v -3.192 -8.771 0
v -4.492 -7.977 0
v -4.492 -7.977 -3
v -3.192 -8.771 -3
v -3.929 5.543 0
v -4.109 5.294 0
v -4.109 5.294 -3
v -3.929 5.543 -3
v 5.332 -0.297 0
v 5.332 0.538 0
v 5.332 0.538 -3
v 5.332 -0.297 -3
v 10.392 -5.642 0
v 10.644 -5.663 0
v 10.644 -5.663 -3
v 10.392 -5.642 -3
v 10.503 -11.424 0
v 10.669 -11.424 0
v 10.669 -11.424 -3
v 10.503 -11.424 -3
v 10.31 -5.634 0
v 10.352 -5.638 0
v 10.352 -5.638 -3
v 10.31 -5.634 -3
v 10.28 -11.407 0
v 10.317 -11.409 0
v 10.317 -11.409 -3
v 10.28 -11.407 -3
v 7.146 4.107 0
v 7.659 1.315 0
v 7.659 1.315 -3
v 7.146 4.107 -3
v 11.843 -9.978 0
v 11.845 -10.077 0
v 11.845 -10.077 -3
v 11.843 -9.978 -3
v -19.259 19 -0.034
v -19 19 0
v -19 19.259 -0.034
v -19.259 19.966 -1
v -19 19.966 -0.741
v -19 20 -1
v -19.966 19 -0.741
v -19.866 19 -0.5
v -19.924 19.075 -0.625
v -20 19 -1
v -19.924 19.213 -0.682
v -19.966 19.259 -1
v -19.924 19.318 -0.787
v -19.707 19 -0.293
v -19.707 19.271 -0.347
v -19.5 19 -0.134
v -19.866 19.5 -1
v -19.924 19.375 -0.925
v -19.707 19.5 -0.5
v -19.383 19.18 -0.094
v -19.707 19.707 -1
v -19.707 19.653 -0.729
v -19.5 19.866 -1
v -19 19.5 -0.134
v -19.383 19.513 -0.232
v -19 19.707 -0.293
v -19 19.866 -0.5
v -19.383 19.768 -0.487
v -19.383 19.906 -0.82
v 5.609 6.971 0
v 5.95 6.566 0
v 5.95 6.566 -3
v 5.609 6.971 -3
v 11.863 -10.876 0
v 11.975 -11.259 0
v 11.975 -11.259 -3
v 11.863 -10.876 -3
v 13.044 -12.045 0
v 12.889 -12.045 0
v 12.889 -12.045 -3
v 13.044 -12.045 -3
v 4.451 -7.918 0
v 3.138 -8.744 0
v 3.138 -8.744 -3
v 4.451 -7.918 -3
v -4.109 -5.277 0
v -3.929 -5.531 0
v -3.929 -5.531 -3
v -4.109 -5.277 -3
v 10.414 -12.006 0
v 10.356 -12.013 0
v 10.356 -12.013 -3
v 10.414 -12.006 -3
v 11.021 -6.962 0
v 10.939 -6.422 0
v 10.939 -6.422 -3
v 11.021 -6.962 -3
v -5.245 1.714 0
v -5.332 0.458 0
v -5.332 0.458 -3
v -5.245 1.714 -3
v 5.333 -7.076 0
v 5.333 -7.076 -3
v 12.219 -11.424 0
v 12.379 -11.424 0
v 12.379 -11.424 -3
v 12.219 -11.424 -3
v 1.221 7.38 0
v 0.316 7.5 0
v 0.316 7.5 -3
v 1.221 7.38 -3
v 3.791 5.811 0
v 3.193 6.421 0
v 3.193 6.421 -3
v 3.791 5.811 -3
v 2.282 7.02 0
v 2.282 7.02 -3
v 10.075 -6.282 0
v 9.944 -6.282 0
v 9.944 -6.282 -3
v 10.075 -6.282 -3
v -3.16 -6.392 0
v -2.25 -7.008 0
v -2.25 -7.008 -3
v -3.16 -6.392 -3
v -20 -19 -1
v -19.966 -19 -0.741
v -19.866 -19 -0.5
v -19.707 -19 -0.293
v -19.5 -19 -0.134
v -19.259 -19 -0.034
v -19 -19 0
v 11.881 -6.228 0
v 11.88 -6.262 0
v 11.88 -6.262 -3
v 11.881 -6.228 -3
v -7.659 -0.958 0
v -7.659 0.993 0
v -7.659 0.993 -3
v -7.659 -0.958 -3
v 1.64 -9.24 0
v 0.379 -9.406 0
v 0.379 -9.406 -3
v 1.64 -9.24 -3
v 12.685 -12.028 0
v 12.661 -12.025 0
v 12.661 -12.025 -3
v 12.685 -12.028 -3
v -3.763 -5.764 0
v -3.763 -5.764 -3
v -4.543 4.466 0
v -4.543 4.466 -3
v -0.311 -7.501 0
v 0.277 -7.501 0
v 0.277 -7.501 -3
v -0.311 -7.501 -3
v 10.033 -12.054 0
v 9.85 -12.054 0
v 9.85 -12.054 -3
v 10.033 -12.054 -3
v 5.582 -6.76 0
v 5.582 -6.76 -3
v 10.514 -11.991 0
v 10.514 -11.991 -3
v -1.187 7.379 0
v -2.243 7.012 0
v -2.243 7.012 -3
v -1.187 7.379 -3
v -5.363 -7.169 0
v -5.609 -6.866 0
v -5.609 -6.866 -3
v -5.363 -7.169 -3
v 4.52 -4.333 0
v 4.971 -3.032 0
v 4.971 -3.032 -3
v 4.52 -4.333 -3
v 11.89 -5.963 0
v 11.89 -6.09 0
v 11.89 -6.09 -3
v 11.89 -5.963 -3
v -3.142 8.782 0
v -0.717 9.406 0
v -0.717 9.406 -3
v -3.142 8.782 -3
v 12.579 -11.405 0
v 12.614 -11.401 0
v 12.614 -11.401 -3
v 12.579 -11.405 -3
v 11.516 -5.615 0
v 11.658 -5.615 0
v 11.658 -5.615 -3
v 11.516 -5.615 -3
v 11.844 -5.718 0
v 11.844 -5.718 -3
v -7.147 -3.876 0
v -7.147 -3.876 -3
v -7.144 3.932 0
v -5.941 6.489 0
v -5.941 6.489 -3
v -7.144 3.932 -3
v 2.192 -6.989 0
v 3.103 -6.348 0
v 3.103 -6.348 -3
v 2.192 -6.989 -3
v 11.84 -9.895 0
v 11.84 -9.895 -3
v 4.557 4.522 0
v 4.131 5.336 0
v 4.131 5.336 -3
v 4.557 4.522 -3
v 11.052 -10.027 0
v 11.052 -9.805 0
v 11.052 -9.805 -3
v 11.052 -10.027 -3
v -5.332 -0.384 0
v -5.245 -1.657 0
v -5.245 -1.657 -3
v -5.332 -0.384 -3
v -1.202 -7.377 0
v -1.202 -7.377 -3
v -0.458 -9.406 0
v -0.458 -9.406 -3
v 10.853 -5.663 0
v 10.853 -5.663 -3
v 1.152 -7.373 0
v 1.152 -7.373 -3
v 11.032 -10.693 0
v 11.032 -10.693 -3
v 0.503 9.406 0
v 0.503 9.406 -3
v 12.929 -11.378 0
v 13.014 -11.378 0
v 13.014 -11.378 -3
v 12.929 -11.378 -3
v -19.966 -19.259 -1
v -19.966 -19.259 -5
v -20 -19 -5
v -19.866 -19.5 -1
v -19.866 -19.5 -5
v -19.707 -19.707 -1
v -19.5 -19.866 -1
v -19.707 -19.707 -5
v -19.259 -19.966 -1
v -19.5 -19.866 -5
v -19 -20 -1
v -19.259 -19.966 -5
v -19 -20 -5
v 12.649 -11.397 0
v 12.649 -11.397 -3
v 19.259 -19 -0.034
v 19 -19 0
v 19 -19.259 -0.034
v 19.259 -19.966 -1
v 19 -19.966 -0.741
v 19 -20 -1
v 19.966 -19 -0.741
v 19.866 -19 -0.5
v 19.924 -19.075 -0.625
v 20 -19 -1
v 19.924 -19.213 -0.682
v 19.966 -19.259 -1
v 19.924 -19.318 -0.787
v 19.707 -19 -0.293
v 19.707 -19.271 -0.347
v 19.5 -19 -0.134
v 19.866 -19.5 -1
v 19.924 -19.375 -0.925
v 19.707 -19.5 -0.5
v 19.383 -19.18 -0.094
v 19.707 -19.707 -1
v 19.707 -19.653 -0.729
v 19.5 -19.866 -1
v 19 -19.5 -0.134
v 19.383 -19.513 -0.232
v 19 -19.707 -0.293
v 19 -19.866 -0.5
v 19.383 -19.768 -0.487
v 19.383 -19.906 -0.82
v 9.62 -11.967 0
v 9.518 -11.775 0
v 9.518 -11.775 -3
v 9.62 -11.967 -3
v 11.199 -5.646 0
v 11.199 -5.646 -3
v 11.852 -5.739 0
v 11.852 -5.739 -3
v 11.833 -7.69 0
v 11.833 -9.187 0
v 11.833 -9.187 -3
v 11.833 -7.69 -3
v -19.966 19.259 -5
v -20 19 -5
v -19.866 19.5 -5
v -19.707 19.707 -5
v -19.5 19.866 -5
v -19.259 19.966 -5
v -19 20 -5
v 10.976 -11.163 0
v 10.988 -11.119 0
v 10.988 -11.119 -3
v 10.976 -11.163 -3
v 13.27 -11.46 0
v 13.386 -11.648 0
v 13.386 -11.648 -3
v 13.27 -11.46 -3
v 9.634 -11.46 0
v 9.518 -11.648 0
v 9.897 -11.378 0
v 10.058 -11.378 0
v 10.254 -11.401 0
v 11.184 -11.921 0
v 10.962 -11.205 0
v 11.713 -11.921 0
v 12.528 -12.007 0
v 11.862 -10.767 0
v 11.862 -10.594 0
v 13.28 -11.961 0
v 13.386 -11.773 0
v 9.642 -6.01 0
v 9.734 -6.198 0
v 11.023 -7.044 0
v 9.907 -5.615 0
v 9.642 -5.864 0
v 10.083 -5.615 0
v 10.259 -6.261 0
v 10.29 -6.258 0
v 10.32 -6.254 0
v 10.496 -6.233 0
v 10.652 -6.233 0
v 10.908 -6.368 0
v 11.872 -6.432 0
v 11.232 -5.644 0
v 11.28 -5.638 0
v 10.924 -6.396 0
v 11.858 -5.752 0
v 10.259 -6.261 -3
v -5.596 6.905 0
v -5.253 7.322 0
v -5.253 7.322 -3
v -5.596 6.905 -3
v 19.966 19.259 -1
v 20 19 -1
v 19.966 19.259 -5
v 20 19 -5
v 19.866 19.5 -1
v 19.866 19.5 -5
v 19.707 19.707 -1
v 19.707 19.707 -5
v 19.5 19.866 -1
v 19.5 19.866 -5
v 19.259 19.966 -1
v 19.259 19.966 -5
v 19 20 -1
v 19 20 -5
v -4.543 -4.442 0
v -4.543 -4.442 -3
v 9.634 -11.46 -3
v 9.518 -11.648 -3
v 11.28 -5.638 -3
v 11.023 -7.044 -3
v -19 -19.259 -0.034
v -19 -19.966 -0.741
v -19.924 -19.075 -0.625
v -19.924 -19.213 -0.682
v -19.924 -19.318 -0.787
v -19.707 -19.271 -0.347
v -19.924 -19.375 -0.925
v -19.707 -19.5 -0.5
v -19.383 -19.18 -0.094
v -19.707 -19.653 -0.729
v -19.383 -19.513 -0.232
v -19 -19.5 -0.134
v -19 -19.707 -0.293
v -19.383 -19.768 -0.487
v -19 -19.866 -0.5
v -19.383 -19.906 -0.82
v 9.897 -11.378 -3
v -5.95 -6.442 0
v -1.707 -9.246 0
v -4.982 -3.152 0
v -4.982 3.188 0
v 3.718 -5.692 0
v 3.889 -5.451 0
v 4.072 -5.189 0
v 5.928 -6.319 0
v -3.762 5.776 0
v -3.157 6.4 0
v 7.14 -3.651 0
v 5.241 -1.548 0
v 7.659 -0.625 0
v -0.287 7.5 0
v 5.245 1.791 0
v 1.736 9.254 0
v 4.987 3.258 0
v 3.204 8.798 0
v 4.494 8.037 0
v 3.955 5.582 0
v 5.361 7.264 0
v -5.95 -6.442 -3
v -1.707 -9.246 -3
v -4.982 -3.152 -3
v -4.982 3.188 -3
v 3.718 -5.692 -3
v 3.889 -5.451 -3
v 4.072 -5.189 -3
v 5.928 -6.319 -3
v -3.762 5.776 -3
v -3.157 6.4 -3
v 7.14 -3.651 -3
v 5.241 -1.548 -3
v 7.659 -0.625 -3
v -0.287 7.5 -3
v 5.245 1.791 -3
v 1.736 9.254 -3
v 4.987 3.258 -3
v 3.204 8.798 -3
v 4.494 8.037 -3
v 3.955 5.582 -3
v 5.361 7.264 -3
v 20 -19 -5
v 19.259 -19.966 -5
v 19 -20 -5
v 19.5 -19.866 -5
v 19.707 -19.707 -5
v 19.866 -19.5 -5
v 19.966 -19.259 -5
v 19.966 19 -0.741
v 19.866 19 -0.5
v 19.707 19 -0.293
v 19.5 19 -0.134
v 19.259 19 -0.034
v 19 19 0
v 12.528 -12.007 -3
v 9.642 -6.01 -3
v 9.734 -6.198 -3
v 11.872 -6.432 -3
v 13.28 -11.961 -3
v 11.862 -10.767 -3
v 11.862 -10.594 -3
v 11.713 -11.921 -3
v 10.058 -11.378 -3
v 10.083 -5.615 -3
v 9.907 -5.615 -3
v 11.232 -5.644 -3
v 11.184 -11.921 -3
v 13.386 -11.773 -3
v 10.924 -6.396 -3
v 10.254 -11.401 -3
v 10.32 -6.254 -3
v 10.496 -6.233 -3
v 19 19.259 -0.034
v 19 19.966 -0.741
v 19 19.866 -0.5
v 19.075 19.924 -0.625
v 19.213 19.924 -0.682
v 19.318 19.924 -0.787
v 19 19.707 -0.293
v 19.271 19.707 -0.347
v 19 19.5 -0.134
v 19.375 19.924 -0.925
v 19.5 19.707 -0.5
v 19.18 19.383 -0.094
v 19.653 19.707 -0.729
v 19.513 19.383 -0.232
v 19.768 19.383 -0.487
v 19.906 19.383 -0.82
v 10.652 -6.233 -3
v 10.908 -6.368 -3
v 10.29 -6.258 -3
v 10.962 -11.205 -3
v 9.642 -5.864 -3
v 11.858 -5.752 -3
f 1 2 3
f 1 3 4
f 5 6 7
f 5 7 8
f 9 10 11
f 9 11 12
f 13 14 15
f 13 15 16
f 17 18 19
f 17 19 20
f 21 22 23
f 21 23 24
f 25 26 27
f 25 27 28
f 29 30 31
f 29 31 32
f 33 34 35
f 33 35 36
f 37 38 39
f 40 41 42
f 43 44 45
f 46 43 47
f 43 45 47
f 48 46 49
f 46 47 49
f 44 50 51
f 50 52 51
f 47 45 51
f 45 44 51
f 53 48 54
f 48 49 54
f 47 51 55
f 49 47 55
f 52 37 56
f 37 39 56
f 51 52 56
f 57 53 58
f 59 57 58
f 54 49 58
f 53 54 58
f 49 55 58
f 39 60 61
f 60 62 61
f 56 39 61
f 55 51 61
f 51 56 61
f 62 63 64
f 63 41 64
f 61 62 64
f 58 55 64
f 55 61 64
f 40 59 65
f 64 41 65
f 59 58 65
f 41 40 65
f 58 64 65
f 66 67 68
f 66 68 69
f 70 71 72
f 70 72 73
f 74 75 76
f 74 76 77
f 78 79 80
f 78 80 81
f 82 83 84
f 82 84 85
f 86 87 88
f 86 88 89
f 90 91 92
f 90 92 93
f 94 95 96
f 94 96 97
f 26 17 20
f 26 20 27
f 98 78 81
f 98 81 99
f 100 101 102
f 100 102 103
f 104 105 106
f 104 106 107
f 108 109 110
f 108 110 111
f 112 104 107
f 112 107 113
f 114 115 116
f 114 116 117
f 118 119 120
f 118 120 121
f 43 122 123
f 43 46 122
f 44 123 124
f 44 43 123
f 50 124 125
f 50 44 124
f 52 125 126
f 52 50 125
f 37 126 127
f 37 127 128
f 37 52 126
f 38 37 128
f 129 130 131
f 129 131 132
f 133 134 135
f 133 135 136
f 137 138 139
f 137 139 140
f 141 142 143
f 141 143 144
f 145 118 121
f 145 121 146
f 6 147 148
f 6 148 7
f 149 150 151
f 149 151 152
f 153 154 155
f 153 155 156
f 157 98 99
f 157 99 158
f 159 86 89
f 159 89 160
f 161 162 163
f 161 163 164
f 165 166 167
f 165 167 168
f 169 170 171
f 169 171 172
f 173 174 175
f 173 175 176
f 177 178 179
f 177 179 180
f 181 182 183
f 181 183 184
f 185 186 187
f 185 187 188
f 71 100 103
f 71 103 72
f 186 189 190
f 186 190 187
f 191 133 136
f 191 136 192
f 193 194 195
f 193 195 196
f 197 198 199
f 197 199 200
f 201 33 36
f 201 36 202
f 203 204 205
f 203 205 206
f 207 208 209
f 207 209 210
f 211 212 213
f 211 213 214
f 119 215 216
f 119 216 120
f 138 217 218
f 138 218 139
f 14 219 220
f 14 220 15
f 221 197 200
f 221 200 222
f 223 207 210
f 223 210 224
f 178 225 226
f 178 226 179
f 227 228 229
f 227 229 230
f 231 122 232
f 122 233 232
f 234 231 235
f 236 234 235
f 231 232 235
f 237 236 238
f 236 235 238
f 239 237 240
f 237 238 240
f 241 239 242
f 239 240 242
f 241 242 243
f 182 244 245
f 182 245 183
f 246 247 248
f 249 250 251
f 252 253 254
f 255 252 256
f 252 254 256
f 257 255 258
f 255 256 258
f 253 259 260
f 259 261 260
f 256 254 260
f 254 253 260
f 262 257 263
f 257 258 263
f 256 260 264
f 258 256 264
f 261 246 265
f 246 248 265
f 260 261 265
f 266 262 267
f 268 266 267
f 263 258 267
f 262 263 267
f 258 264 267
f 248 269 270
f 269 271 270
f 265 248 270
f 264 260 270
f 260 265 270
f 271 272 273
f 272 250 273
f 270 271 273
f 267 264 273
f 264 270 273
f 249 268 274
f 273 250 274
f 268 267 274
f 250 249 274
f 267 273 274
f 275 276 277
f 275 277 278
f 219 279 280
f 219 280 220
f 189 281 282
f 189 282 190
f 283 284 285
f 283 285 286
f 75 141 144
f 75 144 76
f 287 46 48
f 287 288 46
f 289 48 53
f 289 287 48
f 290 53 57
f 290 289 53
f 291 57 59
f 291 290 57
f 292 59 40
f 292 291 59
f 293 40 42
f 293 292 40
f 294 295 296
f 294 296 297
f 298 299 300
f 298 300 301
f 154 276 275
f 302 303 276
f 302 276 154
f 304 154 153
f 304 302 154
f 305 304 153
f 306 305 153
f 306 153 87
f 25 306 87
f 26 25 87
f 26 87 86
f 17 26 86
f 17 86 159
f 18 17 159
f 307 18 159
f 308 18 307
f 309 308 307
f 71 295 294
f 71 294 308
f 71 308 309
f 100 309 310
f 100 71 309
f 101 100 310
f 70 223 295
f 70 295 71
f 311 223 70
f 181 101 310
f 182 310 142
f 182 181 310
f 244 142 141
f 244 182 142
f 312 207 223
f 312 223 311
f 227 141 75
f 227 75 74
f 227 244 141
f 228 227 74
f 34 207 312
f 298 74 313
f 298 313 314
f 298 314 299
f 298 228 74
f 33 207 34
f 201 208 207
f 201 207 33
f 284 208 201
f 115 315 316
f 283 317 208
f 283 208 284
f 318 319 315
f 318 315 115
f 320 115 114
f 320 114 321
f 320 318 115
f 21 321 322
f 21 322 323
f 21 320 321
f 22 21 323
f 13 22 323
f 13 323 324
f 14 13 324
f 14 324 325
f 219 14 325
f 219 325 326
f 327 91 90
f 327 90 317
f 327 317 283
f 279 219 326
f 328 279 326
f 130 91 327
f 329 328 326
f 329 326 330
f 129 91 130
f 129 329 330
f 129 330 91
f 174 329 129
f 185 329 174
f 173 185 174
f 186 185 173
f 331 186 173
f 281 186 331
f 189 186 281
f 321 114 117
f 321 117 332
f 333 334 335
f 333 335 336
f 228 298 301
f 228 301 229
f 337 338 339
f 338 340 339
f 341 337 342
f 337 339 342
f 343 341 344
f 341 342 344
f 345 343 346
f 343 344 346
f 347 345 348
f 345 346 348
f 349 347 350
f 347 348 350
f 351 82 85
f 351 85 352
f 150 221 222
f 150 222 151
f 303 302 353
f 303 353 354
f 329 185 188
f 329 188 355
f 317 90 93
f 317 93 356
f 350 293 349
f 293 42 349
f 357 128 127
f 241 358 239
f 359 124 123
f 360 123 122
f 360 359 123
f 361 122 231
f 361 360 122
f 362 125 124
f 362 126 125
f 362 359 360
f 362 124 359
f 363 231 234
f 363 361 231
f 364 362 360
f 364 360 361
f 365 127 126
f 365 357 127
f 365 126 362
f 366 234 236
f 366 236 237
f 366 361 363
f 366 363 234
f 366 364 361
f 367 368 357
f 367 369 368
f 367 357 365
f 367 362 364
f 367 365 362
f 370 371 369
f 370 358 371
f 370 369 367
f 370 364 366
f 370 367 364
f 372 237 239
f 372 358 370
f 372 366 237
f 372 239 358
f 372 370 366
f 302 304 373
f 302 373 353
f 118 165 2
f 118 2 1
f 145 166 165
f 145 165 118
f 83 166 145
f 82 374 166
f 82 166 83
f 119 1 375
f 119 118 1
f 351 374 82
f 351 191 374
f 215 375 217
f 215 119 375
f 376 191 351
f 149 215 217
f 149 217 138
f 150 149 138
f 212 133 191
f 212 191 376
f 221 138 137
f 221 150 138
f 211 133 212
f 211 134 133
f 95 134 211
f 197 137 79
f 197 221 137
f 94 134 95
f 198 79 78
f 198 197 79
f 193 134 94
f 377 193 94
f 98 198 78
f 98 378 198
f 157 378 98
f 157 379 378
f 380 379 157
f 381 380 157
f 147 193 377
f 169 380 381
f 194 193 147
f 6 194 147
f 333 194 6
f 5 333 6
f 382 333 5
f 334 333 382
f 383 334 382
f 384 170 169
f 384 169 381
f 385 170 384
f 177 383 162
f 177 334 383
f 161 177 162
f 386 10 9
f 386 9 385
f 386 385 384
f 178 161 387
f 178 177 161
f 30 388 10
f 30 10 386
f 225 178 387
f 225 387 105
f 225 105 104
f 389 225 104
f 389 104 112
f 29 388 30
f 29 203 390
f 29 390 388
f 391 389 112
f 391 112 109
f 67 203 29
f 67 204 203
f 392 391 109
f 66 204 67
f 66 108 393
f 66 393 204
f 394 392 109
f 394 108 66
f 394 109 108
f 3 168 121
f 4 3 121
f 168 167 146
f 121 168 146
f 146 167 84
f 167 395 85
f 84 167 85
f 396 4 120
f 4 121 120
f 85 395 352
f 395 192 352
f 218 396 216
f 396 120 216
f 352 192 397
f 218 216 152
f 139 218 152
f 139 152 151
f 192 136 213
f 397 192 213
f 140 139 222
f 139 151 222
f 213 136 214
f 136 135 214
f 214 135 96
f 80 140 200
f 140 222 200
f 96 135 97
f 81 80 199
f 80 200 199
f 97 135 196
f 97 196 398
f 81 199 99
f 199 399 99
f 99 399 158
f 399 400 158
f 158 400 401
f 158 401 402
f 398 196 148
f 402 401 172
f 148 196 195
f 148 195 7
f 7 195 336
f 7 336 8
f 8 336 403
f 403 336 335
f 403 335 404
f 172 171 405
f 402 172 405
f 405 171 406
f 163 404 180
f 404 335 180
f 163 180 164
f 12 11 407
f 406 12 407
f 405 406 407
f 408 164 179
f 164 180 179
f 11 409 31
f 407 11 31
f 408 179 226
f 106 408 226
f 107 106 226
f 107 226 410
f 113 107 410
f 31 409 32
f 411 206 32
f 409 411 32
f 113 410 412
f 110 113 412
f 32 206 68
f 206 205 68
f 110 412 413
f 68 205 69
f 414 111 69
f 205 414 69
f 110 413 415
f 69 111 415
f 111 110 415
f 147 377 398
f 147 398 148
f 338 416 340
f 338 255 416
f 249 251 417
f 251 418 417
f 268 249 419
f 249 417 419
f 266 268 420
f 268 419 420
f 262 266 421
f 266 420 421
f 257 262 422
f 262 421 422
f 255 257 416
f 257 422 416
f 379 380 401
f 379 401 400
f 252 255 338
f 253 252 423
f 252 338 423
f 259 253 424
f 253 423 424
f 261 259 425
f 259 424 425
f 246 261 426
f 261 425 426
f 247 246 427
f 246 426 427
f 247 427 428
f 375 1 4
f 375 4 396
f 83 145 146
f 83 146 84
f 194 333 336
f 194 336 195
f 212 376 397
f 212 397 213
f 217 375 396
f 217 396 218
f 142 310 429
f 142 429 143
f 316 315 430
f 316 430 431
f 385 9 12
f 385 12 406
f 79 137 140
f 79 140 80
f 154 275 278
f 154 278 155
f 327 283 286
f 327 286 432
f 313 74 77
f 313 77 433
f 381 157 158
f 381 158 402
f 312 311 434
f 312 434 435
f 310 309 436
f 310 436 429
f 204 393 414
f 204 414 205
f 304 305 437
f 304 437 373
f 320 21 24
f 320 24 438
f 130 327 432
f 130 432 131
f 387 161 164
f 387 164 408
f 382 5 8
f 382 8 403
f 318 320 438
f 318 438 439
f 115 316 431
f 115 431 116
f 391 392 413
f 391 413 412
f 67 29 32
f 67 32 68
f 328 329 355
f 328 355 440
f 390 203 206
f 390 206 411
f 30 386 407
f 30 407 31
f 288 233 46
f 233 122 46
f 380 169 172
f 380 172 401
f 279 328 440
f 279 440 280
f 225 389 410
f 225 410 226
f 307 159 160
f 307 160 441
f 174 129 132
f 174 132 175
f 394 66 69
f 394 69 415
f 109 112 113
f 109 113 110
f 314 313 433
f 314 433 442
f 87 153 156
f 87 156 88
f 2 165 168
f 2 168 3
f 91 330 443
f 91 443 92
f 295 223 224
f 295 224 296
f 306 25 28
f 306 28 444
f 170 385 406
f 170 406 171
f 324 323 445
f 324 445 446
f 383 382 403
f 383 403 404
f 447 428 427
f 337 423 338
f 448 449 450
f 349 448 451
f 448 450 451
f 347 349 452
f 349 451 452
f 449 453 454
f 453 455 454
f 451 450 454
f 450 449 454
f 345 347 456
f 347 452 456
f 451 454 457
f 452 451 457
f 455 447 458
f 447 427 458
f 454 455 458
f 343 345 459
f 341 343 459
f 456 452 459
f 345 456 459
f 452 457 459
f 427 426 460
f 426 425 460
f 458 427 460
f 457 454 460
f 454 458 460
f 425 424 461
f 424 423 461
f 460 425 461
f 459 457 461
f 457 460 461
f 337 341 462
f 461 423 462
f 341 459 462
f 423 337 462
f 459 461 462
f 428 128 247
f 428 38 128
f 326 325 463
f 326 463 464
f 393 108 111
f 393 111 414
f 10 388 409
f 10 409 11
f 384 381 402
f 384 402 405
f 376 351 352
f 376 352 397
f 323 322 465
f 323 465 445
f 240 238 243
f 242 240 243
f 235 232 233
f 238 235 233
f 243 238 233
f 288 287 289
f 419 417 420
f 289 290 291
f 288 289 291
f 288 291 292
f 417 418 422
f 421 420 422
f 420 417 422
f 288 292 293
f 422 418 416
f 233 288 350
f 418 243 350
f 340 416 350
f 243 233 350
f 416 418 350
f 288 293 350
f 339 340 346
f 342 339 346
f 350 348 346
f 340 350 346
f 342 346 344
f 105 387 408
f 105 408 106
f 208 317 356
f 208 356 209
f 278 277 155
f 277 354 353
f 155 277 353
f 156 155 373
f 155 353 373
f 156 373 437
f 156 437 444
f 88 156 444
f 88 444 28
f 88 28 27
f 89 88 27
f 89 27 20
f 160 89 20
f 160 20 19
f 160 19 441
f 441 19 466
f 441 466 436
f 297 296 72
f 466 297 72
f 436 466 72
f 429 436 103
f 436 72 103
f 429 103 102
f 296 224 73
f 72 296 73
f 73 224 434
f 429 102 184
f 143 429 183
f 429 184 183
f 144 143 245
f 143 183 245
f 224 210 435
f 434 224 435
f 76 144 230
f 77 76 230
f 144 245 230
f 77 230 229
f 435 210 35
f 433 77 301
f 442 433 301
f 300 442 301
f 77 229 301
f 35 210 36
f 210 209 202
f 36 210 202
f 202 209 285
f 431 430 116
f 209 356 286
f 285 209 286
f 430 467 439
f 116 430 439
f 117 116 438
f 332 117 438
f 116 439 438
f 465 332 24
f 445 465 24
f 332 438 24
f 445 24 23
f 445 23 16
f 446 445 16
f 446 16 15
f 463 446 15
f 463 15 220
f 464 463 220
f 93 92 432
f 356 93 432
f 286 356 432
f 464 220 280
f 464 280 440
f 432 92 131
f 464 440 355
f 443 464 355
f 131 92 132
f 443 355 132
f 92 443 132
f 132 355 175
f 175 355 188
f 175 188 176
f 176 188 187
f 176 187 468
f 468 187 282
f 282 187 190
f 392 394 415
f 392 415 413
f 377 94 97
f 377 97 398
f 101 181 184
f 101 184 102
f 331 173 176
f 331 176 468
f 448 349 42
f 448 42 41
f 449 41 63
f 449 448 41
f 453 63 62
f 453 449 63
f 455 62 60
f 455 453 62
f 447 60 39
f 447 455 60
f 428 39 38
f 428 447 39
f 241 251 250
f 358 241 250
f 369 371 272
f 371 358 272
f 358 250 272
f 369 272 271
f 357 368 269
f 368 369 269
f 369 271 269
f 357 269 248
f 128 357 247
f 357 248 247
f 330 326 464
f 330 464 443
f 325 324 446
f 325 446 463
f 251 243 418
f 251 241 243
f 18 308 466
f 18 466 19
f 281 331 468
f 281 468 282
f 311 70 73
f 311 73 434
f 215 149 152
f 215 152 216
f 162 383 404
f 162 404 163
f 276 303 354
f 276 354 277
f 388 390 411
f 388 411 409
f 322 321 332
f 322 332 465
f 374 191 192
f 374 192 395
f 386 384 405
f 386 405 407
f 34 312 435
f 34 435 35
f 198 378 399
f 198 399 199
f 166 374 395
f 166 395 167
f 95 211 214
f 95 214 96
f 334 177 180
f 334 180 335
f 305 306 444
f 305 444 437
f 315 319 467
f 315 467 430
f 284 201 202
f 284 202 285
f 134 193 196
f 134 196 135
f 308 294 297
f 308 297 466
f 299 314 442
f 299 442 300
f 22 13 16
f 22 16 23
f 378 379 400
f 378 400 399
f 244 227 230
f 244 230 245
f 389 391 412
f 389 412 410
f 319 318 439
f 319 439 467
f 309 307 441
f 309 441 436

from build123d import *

# Parameters (mm, degrees)
F0_W     = 40
F0_H     = 40
F1_DEPTH = 5
F2_R     = 1
F5_DEPTH = 3


with BuildPart() as f1:
    # F0 (on Top) → F1 (new body)
    with BuildSketch(Plane.XY):
        Rectangle(F0_W, F0_H)
    extrude(amount=-F1_DEPTH)

    # F2
    f2_edges = [f1.edges().sort_by_distance(p)[0] for p in [
        (0, -20, 0),
        (20, 0, 0),
        (0, 20, 0),
        (-20, 0, 0),
        (-20, 20, -2.5),
        (20, 20, -2.5),
        (-20, -20, -2.5),
        (20, -20, -2.5),
    ]]
    fillet(f2_edges, radius=F2_R)


with BuildPart() as f5:
    # F3 (on Top) + F4 (on Top) → F5 (new body)
    with BuildSketch(Plane.XY):
        Polygon((-0.45753, -9.405798), (-0.03998, -9.405798), (0.378943, -9.405798), (1.639849, -9.240444), (3.137789, -8.744331), (4.451071, -7.91751), (5.333009, -7.075526), (5.582412, -6.759956), (5.928309, -6.318987), (7.13961, -3.651098), (7.659116, -0.624942), (7.659116, 0.383794), (7.659116, 1.315339), (7.146493, 4.107256), (5.950356, 6.565671), (5.608599, 6.970801), (5.360568, 7.264349), (4.493793, 8.037424), (3.203931, 8.798077), (1.736344, 9.254211), (0.502996, 9.405798), (0.092329, 9.405798), (-0.716559, 9.405798), (-3.141904, 8.781567), (-5.253076, 7.32221), (-5.59623, 6.90466), (-5.94073, 6.488506), (-7.14375, 3.93225), (-7.659141, 0.992861), (-7.659141, 0.013106), (-7.659141, -0.958418), (-7.146519, -3.875735), (-5.950382, -6.441643), (-5.608625, -6.866077), (-5.363337, -7.169252), (-4.492396, -7.976768), (-3.191561, -8.770518), (-1.707388, -9.24593), align=None)
        Polygon((-0.286639, 7.49996), (0.013792, 7.49996), (0.315544, 7.49996), (1.220927, 7.380097), (2.282038, 7.020433), (3.192907, 6.420968), (3.790975, 5.810504), (3.954958, 5.581726), (4.131335, 5.336438), (4.557166, 4.522013), (4.987112, 3.258363), (5.244821, 1.790751), (5.331638, 0.53815), (5.331638, 0.119228), (5.331638, -0.296951), (5.24068, -1.548232), (4.970577, -3.032354), (4.519955, -4.333215), (4.072103, -5.188991), (3.888816, -5.450815), (3.71795, -5.691988), (3.103347, -6.347943), (2.192452, -6.988708), (1.152017, -7.373188), (0.276987, -7.501357), (-0.013792, -7.501357), (-0.311429, -7.501357), (-1.201649, -7.377328), (-2.250338, -7.008012), (-3.159836, -6.392037), (-3.763442, -5.763641), (-3.928796, -5.530774), (-4.109314, -5.27718), (-4.5434, -4.442104), (-4.9816, -3.152267), (-5.244821, -1.657096), (-5.331638, -0.383769), (-5.331638, 0.039268), (-5.331638, 0.458191), (-5.244821, 1.713586), (-4.9816, 3.188106), (-4.5434, 4.465549), (-4.109314, 5.293716), (-3.928796, 5.543169), (-3.76207, 5.776036), (-3.157093, 6.400317), (-2.243455, 7.012153), (-1.18651, 7.3787), align=None, mode=Mode.SUBTRACT)
    with BuildSketch(Plane.XY):
        Polygon((11.022813, -7.043704), (11.051744, -9.805293), (11.051744, -10.027137), (11.032465, -10.692744), (10.988345, -11.118549), (10.97595, -11.162644), (10.962183, -11.205367), (10.668661, -11.424467), (10.56668, -11.424467), (10.503281, -11.424467), (10.317252, -11.409303), (10.280041, -11.40656), (10.253853, -11.401048), (10.058172, -11.377629), (9.985147, -11.377629), (9.896958, -11.377629), (9.633738, -11.460306), (9.51799, -11.647708), (9.51799, -11.711106), (9.51799, -11.774504), (9.619971, -11.967417), (9.850095, -12.054235), (9.92726, -12.054235), (10.033381, -12.054235), (10.355834, -12.012909), (10.413721, -12.006), (10.514305, -11.990836), (11.184052, -11.92058), (11.441735, -11.92058), (11.71321, -11.92058), (12.527636, -12.007397), (12.661291, -12.025304), (12.68471, -12.028047), (12.888672, -12.044583), (12.965837, -12.044583), (13.044399, -12.044583), (13.280035, -11.960534), (13.386131, -11.773107), (13.386131, -11.711106), (13.386131, -11.647708), (13.270383, -11.460306), (13.014071, -11.377629), (12.928626, -11.377629), (12.648896, -11.396908), (12.614453, -11.401048), (12.578614, -11.405188), (12.378792, -11.424467), (12.300255, -11.424467), (12.21895, -11.424467), (11.975034, -11.259113), (11.863401, -10.876005), (11.862029, -10.76714), (11.862029, -10.593506), (11.845494, -10.076743), (11.84275, -9.977531), (11.839982, -9.894854), (11.833098, -9.186549), (11.833098, -8.110275), (11.833098, -7.689981), (11.871681, -6.431843), (11.879936, -6.262323), (11.881333, -6.227906), (11.889588, -6.090111), (11.889588, -6.033596), (11.889588, -5.963315), (11.857889, -5.752469), (11.852377, -5.738702), (11.844122, -5.718027), (11.658092, -5.614674), (11.594694, -5.614674), (11.516157, -5.614674), (11.280496, -5.638093), (11.232261, -5.643579), (11.199191, -5.646373), (10.853319, -5.662883), (10.727919, -5.662883), (10.643845, -5.662883), (10.391674, -5.642208), (10.351694, -5.638093), (10.310368, -5.633953), (10.082988, -5.614674), (9.994799, -5.614674), (9.90661, -5.614674), (9.642018, -5.864077), (9.642018, -5.948151), (9.642018, -6.010152), (9.734347, -6.197604), (9.943796, -6.281627), (10.014077, -6.281627), (10.074707, -6.281627), (10.259365, -6.260952), (10.289693, -6.258209), (10.32002, -6.254068), (10.496398, -6.233393), (10.56668, -6.233393), (10.652125, -6.233393), (10.908437, -6.368445), (10.923601, -6.396029), (10.938739, -6.422216), (11.021441, -6.962373), align=None)
    extrude(amount=-F5_DEPTH)


solid = Compound([f1.part, f5.part])
